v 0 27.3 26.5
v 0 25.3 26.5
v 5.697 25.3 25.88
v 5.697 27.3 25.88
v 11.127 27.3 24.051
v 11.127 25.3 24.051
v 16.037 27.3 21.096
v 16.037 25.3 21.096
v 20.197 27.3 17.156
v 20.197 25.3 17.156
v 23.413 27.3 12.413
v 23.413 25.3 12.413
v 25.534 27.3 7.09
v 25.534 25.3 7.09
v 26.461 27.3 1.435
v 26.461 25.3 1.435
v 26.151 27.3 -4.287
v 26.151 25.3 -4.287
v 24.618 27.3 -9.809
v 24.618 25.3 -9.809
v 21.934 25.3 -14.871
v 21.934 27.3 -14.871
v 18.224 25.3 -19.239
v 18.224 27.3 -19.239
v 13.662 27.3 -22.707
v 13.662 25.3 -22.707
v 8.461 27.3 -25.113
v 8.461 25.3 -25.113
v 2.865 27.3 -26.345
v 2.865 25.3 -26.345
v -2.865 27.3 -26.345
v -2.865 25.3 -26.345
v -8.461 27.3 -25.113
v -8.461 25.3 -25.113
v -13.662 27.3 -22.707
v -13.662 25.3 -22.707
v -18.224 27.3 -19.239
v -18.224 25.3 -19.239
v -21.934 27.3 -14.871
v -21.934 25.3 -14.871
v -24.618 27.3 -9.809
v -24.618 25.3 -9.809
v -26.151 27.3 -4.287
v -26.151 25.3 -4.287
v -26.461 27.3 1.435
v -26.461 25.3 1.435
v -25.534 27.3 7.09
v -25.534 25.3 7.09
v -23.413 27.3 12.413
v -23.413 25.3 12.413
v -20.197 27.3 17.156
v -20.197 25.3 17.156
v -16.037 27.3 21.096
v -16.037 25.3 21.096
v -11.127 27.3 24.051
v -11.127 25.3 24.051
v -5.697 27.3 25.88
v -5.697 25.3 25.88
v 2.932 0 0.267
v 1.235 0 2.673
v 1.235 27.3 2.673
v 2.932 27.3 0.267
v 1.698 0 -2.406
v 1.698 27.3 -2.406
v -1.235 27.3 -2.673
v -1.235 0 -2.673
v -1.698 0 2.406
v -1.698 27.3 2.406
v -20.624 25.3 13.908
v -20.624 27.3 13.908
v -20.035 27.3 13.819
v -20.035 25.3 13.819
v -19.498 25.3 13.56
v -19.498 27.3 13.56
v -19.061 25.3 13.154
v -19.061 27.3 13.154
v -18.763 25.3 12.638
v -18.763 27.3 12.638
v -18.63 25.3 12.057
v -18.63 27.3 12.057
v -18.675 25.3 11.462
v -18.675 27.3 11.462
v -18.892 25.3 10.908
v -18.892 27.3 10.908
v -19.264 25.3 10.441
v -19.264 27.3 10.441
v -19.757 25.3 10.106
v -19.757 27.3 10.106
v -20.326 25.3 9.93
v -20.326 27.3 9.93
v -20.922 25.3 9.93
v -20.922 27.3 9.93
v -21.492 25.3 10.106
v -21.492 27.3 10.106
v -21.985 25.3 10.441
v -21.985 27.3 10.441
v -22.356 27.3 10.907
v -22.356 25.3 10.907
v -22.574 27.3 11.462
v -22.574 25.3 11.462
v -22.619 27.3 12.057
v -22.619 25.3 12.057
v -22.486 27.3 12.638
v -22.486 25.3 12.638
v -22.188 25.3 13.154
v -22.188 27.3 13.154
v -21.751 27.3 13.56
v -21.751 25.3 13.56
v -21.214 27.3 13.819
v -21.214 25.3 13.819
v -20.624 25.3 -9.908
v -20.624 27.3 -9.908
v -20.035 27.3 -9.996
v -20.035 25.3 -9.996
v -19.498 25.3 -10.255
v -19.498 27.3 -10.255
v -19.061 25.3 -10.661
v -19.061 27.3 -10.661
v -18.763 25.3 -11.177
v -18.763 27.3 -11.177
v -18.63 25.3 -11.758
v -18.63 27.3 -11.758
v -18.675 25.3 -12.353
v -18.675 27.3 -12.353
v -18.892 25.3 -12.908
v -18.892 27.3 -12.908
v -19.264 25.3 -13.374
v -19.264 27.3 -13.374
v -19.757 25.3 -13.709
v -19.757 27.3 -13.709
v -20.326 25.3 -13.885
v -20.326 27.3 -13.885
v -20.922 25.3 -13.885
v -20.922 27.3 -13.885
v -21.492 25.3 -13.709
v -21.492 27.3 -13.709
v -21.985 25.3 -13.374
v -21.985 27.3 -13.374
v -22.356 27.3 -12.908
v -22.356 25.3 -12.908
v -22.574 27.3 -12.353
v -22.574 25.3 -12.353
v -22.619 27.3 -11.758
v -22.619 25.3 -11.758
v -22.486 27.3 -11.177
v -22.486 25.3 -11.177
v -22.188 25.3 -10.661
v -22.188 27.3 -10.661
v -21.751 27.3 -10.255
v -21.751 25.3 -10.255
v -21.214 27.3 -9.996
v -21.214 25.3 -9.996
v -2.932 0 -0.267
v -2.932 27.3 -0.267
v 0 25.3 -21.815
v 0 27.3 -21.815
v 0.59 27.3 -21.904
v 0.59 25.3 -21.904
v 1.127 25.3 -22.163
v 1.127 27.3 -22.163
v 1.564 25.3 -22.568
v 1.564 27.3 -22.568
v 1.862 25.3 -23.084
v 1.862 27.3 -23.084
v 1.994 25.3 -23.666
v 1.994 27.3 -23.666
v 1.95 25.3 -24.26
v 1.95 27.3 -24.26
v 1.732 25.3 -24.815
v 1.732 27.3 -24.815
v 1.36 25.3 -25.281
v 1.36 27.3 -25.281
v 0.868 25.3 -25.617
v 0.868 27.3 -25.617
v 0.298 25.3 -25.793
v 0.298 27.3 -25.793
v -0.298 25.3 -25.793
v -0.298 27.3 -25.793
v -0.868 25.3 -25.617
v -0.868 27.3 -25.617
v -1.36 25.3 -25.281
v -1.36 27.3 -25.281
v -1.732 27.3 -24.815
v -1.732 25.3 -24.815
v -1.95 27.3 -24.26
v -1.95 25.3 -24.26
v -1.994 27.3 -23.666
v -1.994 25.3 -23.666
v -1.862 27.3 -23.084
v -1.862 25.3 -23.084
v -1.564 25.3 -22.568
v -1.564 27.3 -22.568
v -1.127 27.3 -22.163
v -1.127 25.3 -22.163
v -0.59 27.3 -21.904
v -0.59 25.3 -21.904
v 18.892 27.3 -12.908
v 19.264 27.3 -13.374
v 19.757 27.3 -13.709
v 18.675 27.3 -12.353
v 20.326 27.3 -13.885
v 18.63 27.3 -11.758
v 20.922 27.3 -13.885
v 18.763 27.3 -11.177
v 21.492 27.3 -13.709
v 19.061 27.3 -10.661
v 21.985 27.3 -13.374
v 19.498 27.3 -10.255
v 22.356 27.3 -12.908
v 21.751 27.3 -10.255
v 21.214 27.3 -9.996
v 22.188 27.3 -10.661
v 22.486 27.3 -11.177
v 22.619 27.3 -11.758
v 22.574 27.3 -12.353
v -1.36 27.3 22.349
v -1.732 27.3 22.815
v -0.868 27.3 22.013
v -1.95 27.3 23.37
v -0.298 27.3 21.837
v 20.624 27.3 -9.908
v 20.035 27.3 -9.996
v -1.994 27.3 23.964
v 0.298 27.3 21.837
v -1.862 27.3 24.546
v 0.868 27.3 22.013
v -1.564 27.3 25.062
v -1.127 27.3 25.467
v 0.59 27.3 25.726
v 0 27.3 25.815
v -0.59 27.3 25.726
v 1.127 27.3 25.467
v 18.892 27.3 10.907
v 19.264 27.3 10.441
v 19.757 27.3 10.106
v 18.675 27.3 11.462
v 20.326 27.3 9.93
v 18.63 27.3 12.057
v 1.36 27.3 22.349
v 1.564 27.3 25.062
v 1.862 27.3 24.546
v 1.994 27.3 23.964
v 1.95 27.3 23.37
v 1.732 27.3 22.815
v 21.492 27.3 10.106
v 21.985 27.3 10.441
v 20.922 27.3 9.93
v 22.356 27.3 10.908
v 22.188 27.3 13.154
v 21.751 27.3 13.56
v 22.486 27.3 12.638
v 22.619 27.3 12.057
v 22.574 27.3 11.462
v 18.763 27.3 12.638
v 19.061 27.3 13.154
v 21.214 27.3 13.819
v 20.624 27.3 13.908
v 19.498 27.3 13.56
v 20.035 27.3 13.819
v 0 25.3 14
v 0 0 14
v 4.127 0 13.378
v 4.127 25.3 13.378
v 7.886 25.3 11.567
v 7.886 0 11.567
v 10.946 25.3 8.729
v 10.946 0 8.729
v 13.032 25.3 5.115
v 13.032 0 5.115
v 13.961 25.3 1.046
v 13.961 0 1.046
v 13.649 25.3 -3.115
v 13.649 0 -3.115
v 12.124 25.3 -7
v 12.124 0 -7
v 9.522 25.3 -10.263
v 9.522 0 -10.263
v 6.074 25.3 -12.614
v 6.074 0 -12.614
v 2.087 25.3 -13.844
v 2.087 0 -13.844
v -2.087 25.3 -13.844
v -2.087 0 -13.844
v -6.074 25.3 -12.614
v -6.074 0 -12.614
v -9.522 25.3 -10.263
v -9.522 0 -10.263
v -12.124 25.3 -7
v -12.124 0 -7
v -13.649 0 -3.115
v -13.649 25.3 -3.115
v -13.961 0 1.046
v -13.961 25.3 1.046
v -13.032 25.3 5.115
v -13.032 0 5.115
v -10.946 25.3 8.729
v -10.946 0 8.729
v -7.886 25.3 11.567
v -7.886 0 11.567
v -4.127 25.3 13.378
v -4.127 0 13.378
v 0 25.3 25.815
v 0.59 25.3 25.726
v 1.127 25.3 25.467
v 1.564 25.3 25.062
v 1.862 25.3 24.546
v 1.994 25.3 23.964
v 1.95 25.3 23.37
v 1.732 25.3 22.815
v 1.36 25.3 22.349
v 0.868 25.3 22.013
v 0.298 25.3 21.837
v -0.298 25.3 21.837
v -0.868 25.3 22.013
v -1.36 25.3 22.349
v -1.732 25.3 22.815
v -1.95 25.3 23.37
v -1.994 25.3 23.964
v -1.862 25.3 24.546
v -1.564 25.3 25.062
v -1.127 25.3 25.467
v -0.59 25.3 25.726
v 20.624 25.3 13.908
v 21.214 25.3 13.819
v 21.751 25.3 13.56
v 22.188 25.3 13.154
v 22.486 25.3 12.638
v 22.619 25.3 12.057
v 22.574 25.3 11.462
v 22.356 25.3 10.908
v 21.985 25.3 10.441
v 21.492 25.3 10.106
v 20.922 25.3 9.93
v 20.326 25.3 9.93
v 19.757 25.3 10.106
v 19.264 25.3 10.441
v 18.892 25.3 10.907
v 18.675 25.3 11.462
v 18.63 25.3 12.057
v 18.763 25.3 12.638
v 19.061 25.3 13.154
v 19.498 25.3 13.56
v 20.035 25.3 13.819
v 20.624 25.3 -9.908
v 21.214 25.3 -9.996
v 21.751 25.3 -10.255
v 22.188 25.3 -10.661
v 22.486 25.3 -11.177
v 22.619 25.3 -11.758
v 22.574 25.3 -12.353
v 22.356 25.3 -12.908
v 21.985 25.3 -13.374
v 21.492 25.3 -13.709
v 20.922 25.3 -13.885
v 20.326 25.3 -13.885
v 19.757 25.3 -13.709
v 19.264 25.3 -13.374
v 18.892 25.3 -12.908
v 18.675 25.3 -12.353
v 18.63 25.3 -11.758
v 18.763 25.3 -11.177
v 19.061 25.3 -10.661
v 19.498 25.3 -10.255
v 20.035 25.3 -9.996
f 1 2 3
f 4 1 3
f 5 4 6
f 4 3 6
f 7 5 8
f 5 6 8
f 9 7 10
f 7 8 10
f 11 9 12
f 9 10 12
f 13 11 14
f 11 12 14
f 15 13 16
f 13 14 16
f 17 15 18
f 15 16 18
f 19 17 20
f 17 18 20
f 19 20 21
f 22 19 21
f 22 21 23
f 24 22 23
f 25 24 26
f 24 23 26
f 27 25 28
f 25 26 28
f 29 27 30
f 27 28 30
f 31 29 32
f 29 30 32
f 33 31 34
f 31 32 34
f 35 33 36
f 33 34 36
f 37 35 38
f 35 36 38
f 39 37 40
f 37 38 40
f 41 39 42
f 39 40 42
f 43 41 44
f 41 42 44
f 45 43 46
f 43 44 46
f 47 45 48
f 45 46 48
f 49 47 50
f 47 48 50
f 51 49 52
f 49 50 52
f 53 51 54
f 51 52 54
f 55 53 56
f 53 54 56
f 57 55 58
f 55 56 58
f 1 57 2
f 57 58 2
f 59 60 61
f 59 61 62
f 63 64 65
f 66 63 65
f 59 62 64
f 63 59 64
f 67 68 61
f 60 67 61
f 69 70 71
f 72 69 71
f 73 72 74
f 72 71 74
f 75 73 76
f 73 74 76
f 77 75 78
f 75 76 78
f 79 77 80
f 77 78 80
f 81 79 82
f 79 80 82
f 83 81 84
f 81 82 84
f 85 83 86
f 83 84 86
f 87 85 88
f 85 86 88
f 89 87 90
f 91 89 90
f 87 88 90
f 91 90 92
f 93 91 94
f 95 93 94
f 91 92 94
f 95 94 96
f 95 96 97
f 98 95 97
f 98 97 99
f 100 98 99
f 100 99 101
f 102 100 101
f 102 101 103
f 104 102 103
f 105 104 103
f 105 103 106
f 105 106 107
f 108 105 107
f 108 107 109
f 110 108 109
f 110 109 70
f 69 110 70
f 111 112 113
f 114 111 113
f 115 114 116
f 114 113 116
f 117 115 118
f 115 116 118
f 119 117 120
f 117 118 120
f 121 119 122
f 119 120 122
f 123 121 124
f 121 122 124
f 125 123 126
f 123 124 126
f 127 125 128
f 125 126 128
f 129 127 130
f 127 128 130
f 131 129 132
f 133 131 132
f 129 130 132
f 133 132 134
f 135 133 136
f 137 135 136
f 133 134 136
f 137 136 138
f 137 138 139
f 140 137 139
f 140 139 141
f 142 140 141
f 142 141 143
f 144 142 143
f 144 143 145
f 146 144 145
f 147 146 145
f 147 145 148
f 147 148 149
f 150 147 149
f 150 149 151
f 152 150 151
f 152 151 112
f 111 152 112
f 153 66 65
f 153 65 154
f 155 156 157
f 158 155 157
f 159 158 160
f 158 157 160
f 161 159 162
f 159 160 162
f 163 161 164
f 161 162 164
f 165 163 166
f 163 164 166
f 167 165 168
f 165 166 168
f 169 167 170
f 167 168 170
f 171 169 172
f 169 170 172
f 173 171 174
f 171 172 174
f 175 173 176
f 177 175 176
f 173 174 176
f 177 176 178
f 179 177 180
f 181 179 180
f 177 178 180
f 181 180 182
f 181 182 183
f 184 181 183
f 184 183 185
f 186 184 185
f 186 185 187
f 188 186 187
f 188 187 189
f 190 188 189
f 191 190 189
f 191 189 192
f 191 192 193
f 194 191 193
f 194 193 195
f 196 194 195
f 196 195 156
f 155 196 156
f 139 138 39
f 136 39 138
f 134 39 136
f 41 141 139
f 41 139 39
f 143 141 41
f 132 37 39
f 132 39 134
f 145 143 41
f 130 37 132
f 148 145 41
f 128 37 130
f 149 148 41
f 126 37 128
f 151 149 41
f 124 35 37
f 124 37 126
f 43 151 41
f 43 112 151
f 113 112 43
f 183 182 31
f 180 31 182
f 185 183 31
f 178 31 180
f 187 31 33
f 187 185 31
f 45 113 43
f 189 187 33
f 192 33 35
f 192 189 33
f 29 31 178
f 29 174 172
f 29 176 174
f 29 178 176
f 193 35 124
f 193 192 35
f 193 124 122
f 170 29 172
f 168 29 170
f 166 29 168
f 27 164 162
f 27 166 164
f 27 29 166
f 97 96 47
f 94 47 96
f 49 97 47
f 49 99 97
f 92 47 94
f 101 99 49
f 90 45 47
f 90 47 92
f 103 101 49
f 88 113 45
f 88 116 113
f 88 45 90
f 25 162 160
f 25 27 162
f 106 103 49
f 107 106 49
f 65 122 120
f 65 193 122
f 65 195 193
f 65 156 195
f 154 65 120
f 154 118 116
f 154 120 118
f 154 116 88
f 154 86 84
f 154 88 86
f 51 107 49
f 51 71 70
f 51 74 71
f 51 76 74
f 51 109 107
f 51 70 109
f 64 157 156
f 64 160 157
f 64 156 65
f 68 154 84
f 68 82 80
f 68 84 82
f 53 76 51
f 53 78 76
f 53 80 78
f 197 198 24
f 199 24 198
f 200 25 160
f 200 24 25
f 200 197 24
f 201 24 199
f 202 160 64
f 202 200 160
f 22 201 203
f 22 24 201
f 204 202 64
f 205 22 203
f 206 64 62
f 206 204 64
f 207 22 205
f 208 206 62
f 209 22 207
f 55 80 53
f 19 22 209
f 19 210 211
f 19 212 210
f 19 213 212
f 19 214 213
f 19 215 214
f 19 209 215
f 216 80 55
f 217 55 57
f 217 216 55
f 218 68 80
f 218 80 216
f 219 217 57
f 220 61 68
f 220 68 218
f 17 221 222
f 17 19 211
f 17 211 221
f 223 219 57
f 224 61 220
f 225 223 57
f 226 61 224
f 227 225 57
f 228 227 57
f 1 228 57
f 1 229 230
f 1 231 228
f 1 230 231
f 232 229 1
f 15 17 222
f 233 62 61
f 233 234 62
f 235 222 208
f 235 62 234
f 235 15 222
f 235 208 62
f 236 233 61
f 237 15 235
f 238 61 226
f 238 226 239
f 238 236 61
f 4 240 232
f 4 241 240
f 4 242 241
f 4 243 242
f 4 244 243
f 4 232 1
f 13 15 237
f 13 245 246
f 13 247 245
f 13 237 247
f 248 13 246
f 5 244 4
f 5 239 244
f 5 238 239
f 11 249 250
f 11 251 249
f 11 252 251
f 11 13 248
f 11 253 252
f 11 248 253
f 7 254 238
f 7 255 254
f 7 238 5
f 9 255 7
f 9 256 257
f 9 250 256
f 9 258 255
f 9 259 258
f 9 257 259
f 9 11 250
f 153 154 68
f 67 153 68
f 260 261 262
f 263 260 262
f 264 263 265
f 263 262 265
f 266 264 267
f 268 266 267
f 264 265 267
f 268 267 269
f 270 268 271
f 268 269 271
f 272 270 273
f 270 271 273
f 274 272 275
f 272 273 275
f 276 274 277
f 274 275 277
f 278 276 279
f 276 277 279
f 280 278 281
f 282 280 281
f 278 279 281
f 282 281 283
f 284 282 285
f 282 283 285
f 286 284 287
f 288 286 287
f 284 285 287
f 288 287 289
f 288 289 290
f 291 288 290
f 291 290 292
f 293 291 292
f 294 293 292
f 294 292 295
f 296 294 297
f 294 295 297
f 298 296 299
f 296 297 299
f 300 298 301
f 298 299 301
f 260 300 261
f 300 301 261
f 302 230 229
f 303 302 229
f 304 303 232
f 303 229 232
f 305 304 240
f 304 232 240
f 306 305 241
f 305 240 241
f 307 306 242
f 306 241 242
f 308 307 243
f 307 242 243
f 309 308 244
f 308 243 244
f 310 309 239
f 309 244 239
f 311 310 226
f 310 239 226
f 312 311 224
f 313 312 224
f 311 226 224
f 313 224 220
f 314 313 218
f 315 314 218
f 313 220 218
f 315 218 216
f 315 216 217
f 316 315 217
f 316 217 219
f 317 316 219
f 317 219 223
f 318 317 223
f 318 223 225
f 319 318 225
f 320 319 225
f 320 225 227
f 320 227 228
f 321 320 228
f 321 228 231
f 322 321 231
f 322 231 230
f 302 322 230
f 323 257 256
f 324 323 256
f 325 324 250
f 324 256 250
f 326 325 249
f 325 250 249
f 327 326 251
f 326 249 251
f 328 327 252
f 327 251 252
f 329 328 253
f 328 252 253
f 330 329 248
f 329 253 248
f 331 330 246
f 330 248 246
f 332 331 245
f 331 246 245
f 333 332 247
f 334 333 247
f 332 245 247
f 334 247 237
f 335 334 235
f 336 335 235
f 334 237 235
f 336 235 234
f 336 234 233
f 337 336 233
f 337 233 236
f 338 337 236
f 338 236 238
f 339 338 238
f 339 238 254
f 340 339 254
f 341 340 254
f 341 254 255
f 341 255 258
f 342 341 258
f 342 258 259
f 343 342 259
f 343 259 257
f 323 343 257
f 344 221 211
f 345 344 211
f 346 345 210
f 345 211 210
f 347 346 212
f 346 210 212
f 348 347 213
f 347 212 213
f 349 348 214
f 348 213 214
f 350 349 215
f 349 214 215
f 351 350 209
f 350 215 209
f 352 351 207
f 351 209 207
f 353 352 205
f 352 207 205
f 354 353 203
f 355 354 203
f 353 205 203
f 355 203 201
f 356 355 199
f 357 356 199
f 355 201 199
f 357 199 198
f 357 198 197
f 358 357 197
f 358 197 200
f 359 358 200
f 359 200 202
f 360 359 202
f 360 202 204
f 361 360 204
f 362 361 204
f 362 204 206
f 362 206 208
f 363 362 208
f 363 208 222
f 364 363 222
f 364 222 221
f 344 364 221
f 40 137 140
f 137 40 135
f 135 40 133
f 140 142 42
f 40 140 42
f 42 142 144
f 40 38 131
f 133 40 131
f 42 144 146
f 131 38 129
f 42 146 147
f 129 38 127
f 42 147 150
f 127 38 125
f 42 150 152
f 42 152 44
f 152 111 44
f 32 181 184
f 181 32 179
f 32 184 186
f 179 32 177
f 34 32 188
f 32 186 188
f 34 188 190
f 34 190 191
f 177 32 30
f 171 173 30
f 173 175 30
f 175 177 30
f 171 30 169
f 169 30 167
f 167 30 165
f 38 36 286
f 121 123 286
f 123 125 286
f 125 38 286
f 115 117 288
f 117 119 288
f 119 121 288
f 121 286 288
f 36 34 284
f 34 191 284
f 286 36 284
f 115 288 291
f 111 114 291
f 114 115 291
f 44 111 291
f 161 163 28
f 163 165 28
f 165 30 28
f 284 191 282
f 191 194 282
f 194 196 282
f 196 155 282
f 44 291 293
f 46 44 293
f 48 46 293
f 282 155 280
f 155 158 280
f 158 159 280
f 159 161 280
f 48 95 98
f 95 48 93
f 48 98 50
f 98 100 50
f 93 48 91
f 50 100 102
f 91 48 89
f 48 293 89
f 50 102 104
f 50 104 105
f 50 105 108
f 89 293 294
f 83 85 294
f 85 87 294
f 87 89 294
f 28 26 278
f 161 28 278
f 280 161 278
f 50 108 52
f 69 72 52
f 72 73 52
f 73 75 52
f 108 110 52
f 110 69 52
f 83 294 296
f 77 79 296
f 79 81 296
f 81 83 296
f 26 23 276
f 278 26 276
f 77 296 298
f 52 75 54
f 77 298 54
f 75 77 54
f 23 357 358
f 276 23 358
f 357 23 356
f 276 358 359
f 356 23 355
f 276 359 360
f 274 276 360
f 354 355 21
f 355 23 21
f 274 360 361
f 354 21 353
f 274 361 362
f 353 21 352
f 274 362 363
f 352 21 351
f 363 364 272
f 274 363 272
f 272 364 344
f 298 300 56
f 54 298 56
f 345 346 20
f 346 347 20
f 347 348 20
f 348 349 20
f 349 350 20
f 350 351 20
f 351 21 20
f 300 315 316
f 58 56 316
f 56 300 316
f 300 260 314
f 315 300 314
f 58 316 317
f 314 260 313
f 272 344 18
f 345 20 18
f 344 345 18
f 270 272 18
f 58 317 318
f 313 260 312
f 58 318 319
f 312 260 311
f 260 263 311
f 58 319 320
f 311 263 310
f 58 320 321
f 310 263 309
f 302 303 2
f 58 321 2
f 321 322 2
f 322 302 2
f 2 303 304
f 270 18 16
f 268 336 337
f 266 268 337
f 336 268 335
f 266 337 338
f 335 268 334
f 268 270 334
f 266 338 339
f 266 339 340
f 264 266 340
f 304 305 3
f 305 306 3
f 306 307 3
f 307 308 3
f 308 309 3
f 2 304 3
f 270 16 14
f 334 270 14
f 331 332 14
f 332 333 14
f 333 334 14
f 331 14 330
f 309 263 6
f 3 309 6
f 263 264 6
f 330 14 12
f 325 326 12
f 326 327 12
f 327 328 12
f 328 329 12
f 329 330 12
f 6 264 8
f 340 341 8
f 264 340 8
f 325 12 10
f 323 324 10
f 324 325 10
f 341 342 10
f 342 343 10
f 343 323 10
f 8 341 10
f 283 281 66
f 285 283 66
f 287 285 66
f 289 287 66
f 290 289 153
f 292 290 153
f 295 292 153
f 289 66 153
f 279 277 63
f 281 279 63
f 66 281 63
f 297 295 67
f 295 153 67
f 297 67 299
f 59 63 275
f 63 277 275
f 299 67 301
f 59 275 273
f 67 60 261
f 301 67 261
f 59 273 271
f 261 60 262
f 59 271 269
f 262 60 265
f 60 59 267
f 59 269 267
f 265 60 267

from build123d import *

# Parameters (mm, degrees)
SKETCH1_R           = 14
BOSS_EXTRUDE1_DEPTH = 25.3
SKETCH2_R           = 26.5
BOSS_EXTRUDE2_DEPTH = 2
SKETCH3_R           = 2
CUT_EXTRUDE1_DEPTH  = 32


with BuildPart() as part:
    # Sketch1 → Boss-Extrude1 (new body)
    with BuildSketch(Plane(origin=(0, 0, 0), x_dir=(1, 0, 0), z_dir=(0, 1, 0))):
        with Locations(Location((0, 0, 0), (0, 0, 270))):
            Circle(SKETCH1_R)
    extrude(amount=BOSS_EXTRUDE1_DEPTH)

    # Sketch2 → Boss-Extrude2 (add)
    with BuildSketch(Plane(origin=(0, 25.3, 0), x_dir=(1, 0, 0), z_dir=(0, 1, 0))):
        with Locations(Location((0, 0, 0), (0, 0, 270))):
            Circle(SKETCH2_R)
    extrude(amount=BOSS_EXTRUDE2_DEPTH)

    # Sketch3 → Cut-Extrude1 (cut)
    with BuildSketch(Plane(origin=(0, 27.3, 0), x_dir=(1, 0, 0), z_dir=(0, 1, 0))):
        with Locations(Location((0, 23.815, 0), (0, 0, 270))):
            Circle(SKETCH3_R)
        with Locations(Location((20.624394991, 11.9075, 0), (0, 0, 270))):
            Circle(SKETCH3_R)
        with Locations(Location((20.624394991, -11.9075, 0), (0, 0, 270))):
            Circle(SKETCH3_R)
        with Locations(Location((0, -23.815, 0), (0, 0, 270))):
            Circle(SKETCH3_R)
        with Locations(Location((-20.624394991, -11.9075, 0), (0, 0, 270))):
            Circle(SKETCH3_R)
        with Locations(Location((-20.624394991, 11.9075, 0), (0, 0, 270))):
            Circle(SKETCH3_R)
        Polygon((1.234520104, -2.673192869), (2.932312985, -0.267470663), (1.697792881, 2.405722206), (-1.234520104, 2.673192869), (-2.932312985, 0.267470663), (-1.697792881, -2.405722206), align=None)
    extrude(amount=-CUT_EXTRUDE1_DEPTH, mode=Mode.SUBTRACT)


solid = part.part
